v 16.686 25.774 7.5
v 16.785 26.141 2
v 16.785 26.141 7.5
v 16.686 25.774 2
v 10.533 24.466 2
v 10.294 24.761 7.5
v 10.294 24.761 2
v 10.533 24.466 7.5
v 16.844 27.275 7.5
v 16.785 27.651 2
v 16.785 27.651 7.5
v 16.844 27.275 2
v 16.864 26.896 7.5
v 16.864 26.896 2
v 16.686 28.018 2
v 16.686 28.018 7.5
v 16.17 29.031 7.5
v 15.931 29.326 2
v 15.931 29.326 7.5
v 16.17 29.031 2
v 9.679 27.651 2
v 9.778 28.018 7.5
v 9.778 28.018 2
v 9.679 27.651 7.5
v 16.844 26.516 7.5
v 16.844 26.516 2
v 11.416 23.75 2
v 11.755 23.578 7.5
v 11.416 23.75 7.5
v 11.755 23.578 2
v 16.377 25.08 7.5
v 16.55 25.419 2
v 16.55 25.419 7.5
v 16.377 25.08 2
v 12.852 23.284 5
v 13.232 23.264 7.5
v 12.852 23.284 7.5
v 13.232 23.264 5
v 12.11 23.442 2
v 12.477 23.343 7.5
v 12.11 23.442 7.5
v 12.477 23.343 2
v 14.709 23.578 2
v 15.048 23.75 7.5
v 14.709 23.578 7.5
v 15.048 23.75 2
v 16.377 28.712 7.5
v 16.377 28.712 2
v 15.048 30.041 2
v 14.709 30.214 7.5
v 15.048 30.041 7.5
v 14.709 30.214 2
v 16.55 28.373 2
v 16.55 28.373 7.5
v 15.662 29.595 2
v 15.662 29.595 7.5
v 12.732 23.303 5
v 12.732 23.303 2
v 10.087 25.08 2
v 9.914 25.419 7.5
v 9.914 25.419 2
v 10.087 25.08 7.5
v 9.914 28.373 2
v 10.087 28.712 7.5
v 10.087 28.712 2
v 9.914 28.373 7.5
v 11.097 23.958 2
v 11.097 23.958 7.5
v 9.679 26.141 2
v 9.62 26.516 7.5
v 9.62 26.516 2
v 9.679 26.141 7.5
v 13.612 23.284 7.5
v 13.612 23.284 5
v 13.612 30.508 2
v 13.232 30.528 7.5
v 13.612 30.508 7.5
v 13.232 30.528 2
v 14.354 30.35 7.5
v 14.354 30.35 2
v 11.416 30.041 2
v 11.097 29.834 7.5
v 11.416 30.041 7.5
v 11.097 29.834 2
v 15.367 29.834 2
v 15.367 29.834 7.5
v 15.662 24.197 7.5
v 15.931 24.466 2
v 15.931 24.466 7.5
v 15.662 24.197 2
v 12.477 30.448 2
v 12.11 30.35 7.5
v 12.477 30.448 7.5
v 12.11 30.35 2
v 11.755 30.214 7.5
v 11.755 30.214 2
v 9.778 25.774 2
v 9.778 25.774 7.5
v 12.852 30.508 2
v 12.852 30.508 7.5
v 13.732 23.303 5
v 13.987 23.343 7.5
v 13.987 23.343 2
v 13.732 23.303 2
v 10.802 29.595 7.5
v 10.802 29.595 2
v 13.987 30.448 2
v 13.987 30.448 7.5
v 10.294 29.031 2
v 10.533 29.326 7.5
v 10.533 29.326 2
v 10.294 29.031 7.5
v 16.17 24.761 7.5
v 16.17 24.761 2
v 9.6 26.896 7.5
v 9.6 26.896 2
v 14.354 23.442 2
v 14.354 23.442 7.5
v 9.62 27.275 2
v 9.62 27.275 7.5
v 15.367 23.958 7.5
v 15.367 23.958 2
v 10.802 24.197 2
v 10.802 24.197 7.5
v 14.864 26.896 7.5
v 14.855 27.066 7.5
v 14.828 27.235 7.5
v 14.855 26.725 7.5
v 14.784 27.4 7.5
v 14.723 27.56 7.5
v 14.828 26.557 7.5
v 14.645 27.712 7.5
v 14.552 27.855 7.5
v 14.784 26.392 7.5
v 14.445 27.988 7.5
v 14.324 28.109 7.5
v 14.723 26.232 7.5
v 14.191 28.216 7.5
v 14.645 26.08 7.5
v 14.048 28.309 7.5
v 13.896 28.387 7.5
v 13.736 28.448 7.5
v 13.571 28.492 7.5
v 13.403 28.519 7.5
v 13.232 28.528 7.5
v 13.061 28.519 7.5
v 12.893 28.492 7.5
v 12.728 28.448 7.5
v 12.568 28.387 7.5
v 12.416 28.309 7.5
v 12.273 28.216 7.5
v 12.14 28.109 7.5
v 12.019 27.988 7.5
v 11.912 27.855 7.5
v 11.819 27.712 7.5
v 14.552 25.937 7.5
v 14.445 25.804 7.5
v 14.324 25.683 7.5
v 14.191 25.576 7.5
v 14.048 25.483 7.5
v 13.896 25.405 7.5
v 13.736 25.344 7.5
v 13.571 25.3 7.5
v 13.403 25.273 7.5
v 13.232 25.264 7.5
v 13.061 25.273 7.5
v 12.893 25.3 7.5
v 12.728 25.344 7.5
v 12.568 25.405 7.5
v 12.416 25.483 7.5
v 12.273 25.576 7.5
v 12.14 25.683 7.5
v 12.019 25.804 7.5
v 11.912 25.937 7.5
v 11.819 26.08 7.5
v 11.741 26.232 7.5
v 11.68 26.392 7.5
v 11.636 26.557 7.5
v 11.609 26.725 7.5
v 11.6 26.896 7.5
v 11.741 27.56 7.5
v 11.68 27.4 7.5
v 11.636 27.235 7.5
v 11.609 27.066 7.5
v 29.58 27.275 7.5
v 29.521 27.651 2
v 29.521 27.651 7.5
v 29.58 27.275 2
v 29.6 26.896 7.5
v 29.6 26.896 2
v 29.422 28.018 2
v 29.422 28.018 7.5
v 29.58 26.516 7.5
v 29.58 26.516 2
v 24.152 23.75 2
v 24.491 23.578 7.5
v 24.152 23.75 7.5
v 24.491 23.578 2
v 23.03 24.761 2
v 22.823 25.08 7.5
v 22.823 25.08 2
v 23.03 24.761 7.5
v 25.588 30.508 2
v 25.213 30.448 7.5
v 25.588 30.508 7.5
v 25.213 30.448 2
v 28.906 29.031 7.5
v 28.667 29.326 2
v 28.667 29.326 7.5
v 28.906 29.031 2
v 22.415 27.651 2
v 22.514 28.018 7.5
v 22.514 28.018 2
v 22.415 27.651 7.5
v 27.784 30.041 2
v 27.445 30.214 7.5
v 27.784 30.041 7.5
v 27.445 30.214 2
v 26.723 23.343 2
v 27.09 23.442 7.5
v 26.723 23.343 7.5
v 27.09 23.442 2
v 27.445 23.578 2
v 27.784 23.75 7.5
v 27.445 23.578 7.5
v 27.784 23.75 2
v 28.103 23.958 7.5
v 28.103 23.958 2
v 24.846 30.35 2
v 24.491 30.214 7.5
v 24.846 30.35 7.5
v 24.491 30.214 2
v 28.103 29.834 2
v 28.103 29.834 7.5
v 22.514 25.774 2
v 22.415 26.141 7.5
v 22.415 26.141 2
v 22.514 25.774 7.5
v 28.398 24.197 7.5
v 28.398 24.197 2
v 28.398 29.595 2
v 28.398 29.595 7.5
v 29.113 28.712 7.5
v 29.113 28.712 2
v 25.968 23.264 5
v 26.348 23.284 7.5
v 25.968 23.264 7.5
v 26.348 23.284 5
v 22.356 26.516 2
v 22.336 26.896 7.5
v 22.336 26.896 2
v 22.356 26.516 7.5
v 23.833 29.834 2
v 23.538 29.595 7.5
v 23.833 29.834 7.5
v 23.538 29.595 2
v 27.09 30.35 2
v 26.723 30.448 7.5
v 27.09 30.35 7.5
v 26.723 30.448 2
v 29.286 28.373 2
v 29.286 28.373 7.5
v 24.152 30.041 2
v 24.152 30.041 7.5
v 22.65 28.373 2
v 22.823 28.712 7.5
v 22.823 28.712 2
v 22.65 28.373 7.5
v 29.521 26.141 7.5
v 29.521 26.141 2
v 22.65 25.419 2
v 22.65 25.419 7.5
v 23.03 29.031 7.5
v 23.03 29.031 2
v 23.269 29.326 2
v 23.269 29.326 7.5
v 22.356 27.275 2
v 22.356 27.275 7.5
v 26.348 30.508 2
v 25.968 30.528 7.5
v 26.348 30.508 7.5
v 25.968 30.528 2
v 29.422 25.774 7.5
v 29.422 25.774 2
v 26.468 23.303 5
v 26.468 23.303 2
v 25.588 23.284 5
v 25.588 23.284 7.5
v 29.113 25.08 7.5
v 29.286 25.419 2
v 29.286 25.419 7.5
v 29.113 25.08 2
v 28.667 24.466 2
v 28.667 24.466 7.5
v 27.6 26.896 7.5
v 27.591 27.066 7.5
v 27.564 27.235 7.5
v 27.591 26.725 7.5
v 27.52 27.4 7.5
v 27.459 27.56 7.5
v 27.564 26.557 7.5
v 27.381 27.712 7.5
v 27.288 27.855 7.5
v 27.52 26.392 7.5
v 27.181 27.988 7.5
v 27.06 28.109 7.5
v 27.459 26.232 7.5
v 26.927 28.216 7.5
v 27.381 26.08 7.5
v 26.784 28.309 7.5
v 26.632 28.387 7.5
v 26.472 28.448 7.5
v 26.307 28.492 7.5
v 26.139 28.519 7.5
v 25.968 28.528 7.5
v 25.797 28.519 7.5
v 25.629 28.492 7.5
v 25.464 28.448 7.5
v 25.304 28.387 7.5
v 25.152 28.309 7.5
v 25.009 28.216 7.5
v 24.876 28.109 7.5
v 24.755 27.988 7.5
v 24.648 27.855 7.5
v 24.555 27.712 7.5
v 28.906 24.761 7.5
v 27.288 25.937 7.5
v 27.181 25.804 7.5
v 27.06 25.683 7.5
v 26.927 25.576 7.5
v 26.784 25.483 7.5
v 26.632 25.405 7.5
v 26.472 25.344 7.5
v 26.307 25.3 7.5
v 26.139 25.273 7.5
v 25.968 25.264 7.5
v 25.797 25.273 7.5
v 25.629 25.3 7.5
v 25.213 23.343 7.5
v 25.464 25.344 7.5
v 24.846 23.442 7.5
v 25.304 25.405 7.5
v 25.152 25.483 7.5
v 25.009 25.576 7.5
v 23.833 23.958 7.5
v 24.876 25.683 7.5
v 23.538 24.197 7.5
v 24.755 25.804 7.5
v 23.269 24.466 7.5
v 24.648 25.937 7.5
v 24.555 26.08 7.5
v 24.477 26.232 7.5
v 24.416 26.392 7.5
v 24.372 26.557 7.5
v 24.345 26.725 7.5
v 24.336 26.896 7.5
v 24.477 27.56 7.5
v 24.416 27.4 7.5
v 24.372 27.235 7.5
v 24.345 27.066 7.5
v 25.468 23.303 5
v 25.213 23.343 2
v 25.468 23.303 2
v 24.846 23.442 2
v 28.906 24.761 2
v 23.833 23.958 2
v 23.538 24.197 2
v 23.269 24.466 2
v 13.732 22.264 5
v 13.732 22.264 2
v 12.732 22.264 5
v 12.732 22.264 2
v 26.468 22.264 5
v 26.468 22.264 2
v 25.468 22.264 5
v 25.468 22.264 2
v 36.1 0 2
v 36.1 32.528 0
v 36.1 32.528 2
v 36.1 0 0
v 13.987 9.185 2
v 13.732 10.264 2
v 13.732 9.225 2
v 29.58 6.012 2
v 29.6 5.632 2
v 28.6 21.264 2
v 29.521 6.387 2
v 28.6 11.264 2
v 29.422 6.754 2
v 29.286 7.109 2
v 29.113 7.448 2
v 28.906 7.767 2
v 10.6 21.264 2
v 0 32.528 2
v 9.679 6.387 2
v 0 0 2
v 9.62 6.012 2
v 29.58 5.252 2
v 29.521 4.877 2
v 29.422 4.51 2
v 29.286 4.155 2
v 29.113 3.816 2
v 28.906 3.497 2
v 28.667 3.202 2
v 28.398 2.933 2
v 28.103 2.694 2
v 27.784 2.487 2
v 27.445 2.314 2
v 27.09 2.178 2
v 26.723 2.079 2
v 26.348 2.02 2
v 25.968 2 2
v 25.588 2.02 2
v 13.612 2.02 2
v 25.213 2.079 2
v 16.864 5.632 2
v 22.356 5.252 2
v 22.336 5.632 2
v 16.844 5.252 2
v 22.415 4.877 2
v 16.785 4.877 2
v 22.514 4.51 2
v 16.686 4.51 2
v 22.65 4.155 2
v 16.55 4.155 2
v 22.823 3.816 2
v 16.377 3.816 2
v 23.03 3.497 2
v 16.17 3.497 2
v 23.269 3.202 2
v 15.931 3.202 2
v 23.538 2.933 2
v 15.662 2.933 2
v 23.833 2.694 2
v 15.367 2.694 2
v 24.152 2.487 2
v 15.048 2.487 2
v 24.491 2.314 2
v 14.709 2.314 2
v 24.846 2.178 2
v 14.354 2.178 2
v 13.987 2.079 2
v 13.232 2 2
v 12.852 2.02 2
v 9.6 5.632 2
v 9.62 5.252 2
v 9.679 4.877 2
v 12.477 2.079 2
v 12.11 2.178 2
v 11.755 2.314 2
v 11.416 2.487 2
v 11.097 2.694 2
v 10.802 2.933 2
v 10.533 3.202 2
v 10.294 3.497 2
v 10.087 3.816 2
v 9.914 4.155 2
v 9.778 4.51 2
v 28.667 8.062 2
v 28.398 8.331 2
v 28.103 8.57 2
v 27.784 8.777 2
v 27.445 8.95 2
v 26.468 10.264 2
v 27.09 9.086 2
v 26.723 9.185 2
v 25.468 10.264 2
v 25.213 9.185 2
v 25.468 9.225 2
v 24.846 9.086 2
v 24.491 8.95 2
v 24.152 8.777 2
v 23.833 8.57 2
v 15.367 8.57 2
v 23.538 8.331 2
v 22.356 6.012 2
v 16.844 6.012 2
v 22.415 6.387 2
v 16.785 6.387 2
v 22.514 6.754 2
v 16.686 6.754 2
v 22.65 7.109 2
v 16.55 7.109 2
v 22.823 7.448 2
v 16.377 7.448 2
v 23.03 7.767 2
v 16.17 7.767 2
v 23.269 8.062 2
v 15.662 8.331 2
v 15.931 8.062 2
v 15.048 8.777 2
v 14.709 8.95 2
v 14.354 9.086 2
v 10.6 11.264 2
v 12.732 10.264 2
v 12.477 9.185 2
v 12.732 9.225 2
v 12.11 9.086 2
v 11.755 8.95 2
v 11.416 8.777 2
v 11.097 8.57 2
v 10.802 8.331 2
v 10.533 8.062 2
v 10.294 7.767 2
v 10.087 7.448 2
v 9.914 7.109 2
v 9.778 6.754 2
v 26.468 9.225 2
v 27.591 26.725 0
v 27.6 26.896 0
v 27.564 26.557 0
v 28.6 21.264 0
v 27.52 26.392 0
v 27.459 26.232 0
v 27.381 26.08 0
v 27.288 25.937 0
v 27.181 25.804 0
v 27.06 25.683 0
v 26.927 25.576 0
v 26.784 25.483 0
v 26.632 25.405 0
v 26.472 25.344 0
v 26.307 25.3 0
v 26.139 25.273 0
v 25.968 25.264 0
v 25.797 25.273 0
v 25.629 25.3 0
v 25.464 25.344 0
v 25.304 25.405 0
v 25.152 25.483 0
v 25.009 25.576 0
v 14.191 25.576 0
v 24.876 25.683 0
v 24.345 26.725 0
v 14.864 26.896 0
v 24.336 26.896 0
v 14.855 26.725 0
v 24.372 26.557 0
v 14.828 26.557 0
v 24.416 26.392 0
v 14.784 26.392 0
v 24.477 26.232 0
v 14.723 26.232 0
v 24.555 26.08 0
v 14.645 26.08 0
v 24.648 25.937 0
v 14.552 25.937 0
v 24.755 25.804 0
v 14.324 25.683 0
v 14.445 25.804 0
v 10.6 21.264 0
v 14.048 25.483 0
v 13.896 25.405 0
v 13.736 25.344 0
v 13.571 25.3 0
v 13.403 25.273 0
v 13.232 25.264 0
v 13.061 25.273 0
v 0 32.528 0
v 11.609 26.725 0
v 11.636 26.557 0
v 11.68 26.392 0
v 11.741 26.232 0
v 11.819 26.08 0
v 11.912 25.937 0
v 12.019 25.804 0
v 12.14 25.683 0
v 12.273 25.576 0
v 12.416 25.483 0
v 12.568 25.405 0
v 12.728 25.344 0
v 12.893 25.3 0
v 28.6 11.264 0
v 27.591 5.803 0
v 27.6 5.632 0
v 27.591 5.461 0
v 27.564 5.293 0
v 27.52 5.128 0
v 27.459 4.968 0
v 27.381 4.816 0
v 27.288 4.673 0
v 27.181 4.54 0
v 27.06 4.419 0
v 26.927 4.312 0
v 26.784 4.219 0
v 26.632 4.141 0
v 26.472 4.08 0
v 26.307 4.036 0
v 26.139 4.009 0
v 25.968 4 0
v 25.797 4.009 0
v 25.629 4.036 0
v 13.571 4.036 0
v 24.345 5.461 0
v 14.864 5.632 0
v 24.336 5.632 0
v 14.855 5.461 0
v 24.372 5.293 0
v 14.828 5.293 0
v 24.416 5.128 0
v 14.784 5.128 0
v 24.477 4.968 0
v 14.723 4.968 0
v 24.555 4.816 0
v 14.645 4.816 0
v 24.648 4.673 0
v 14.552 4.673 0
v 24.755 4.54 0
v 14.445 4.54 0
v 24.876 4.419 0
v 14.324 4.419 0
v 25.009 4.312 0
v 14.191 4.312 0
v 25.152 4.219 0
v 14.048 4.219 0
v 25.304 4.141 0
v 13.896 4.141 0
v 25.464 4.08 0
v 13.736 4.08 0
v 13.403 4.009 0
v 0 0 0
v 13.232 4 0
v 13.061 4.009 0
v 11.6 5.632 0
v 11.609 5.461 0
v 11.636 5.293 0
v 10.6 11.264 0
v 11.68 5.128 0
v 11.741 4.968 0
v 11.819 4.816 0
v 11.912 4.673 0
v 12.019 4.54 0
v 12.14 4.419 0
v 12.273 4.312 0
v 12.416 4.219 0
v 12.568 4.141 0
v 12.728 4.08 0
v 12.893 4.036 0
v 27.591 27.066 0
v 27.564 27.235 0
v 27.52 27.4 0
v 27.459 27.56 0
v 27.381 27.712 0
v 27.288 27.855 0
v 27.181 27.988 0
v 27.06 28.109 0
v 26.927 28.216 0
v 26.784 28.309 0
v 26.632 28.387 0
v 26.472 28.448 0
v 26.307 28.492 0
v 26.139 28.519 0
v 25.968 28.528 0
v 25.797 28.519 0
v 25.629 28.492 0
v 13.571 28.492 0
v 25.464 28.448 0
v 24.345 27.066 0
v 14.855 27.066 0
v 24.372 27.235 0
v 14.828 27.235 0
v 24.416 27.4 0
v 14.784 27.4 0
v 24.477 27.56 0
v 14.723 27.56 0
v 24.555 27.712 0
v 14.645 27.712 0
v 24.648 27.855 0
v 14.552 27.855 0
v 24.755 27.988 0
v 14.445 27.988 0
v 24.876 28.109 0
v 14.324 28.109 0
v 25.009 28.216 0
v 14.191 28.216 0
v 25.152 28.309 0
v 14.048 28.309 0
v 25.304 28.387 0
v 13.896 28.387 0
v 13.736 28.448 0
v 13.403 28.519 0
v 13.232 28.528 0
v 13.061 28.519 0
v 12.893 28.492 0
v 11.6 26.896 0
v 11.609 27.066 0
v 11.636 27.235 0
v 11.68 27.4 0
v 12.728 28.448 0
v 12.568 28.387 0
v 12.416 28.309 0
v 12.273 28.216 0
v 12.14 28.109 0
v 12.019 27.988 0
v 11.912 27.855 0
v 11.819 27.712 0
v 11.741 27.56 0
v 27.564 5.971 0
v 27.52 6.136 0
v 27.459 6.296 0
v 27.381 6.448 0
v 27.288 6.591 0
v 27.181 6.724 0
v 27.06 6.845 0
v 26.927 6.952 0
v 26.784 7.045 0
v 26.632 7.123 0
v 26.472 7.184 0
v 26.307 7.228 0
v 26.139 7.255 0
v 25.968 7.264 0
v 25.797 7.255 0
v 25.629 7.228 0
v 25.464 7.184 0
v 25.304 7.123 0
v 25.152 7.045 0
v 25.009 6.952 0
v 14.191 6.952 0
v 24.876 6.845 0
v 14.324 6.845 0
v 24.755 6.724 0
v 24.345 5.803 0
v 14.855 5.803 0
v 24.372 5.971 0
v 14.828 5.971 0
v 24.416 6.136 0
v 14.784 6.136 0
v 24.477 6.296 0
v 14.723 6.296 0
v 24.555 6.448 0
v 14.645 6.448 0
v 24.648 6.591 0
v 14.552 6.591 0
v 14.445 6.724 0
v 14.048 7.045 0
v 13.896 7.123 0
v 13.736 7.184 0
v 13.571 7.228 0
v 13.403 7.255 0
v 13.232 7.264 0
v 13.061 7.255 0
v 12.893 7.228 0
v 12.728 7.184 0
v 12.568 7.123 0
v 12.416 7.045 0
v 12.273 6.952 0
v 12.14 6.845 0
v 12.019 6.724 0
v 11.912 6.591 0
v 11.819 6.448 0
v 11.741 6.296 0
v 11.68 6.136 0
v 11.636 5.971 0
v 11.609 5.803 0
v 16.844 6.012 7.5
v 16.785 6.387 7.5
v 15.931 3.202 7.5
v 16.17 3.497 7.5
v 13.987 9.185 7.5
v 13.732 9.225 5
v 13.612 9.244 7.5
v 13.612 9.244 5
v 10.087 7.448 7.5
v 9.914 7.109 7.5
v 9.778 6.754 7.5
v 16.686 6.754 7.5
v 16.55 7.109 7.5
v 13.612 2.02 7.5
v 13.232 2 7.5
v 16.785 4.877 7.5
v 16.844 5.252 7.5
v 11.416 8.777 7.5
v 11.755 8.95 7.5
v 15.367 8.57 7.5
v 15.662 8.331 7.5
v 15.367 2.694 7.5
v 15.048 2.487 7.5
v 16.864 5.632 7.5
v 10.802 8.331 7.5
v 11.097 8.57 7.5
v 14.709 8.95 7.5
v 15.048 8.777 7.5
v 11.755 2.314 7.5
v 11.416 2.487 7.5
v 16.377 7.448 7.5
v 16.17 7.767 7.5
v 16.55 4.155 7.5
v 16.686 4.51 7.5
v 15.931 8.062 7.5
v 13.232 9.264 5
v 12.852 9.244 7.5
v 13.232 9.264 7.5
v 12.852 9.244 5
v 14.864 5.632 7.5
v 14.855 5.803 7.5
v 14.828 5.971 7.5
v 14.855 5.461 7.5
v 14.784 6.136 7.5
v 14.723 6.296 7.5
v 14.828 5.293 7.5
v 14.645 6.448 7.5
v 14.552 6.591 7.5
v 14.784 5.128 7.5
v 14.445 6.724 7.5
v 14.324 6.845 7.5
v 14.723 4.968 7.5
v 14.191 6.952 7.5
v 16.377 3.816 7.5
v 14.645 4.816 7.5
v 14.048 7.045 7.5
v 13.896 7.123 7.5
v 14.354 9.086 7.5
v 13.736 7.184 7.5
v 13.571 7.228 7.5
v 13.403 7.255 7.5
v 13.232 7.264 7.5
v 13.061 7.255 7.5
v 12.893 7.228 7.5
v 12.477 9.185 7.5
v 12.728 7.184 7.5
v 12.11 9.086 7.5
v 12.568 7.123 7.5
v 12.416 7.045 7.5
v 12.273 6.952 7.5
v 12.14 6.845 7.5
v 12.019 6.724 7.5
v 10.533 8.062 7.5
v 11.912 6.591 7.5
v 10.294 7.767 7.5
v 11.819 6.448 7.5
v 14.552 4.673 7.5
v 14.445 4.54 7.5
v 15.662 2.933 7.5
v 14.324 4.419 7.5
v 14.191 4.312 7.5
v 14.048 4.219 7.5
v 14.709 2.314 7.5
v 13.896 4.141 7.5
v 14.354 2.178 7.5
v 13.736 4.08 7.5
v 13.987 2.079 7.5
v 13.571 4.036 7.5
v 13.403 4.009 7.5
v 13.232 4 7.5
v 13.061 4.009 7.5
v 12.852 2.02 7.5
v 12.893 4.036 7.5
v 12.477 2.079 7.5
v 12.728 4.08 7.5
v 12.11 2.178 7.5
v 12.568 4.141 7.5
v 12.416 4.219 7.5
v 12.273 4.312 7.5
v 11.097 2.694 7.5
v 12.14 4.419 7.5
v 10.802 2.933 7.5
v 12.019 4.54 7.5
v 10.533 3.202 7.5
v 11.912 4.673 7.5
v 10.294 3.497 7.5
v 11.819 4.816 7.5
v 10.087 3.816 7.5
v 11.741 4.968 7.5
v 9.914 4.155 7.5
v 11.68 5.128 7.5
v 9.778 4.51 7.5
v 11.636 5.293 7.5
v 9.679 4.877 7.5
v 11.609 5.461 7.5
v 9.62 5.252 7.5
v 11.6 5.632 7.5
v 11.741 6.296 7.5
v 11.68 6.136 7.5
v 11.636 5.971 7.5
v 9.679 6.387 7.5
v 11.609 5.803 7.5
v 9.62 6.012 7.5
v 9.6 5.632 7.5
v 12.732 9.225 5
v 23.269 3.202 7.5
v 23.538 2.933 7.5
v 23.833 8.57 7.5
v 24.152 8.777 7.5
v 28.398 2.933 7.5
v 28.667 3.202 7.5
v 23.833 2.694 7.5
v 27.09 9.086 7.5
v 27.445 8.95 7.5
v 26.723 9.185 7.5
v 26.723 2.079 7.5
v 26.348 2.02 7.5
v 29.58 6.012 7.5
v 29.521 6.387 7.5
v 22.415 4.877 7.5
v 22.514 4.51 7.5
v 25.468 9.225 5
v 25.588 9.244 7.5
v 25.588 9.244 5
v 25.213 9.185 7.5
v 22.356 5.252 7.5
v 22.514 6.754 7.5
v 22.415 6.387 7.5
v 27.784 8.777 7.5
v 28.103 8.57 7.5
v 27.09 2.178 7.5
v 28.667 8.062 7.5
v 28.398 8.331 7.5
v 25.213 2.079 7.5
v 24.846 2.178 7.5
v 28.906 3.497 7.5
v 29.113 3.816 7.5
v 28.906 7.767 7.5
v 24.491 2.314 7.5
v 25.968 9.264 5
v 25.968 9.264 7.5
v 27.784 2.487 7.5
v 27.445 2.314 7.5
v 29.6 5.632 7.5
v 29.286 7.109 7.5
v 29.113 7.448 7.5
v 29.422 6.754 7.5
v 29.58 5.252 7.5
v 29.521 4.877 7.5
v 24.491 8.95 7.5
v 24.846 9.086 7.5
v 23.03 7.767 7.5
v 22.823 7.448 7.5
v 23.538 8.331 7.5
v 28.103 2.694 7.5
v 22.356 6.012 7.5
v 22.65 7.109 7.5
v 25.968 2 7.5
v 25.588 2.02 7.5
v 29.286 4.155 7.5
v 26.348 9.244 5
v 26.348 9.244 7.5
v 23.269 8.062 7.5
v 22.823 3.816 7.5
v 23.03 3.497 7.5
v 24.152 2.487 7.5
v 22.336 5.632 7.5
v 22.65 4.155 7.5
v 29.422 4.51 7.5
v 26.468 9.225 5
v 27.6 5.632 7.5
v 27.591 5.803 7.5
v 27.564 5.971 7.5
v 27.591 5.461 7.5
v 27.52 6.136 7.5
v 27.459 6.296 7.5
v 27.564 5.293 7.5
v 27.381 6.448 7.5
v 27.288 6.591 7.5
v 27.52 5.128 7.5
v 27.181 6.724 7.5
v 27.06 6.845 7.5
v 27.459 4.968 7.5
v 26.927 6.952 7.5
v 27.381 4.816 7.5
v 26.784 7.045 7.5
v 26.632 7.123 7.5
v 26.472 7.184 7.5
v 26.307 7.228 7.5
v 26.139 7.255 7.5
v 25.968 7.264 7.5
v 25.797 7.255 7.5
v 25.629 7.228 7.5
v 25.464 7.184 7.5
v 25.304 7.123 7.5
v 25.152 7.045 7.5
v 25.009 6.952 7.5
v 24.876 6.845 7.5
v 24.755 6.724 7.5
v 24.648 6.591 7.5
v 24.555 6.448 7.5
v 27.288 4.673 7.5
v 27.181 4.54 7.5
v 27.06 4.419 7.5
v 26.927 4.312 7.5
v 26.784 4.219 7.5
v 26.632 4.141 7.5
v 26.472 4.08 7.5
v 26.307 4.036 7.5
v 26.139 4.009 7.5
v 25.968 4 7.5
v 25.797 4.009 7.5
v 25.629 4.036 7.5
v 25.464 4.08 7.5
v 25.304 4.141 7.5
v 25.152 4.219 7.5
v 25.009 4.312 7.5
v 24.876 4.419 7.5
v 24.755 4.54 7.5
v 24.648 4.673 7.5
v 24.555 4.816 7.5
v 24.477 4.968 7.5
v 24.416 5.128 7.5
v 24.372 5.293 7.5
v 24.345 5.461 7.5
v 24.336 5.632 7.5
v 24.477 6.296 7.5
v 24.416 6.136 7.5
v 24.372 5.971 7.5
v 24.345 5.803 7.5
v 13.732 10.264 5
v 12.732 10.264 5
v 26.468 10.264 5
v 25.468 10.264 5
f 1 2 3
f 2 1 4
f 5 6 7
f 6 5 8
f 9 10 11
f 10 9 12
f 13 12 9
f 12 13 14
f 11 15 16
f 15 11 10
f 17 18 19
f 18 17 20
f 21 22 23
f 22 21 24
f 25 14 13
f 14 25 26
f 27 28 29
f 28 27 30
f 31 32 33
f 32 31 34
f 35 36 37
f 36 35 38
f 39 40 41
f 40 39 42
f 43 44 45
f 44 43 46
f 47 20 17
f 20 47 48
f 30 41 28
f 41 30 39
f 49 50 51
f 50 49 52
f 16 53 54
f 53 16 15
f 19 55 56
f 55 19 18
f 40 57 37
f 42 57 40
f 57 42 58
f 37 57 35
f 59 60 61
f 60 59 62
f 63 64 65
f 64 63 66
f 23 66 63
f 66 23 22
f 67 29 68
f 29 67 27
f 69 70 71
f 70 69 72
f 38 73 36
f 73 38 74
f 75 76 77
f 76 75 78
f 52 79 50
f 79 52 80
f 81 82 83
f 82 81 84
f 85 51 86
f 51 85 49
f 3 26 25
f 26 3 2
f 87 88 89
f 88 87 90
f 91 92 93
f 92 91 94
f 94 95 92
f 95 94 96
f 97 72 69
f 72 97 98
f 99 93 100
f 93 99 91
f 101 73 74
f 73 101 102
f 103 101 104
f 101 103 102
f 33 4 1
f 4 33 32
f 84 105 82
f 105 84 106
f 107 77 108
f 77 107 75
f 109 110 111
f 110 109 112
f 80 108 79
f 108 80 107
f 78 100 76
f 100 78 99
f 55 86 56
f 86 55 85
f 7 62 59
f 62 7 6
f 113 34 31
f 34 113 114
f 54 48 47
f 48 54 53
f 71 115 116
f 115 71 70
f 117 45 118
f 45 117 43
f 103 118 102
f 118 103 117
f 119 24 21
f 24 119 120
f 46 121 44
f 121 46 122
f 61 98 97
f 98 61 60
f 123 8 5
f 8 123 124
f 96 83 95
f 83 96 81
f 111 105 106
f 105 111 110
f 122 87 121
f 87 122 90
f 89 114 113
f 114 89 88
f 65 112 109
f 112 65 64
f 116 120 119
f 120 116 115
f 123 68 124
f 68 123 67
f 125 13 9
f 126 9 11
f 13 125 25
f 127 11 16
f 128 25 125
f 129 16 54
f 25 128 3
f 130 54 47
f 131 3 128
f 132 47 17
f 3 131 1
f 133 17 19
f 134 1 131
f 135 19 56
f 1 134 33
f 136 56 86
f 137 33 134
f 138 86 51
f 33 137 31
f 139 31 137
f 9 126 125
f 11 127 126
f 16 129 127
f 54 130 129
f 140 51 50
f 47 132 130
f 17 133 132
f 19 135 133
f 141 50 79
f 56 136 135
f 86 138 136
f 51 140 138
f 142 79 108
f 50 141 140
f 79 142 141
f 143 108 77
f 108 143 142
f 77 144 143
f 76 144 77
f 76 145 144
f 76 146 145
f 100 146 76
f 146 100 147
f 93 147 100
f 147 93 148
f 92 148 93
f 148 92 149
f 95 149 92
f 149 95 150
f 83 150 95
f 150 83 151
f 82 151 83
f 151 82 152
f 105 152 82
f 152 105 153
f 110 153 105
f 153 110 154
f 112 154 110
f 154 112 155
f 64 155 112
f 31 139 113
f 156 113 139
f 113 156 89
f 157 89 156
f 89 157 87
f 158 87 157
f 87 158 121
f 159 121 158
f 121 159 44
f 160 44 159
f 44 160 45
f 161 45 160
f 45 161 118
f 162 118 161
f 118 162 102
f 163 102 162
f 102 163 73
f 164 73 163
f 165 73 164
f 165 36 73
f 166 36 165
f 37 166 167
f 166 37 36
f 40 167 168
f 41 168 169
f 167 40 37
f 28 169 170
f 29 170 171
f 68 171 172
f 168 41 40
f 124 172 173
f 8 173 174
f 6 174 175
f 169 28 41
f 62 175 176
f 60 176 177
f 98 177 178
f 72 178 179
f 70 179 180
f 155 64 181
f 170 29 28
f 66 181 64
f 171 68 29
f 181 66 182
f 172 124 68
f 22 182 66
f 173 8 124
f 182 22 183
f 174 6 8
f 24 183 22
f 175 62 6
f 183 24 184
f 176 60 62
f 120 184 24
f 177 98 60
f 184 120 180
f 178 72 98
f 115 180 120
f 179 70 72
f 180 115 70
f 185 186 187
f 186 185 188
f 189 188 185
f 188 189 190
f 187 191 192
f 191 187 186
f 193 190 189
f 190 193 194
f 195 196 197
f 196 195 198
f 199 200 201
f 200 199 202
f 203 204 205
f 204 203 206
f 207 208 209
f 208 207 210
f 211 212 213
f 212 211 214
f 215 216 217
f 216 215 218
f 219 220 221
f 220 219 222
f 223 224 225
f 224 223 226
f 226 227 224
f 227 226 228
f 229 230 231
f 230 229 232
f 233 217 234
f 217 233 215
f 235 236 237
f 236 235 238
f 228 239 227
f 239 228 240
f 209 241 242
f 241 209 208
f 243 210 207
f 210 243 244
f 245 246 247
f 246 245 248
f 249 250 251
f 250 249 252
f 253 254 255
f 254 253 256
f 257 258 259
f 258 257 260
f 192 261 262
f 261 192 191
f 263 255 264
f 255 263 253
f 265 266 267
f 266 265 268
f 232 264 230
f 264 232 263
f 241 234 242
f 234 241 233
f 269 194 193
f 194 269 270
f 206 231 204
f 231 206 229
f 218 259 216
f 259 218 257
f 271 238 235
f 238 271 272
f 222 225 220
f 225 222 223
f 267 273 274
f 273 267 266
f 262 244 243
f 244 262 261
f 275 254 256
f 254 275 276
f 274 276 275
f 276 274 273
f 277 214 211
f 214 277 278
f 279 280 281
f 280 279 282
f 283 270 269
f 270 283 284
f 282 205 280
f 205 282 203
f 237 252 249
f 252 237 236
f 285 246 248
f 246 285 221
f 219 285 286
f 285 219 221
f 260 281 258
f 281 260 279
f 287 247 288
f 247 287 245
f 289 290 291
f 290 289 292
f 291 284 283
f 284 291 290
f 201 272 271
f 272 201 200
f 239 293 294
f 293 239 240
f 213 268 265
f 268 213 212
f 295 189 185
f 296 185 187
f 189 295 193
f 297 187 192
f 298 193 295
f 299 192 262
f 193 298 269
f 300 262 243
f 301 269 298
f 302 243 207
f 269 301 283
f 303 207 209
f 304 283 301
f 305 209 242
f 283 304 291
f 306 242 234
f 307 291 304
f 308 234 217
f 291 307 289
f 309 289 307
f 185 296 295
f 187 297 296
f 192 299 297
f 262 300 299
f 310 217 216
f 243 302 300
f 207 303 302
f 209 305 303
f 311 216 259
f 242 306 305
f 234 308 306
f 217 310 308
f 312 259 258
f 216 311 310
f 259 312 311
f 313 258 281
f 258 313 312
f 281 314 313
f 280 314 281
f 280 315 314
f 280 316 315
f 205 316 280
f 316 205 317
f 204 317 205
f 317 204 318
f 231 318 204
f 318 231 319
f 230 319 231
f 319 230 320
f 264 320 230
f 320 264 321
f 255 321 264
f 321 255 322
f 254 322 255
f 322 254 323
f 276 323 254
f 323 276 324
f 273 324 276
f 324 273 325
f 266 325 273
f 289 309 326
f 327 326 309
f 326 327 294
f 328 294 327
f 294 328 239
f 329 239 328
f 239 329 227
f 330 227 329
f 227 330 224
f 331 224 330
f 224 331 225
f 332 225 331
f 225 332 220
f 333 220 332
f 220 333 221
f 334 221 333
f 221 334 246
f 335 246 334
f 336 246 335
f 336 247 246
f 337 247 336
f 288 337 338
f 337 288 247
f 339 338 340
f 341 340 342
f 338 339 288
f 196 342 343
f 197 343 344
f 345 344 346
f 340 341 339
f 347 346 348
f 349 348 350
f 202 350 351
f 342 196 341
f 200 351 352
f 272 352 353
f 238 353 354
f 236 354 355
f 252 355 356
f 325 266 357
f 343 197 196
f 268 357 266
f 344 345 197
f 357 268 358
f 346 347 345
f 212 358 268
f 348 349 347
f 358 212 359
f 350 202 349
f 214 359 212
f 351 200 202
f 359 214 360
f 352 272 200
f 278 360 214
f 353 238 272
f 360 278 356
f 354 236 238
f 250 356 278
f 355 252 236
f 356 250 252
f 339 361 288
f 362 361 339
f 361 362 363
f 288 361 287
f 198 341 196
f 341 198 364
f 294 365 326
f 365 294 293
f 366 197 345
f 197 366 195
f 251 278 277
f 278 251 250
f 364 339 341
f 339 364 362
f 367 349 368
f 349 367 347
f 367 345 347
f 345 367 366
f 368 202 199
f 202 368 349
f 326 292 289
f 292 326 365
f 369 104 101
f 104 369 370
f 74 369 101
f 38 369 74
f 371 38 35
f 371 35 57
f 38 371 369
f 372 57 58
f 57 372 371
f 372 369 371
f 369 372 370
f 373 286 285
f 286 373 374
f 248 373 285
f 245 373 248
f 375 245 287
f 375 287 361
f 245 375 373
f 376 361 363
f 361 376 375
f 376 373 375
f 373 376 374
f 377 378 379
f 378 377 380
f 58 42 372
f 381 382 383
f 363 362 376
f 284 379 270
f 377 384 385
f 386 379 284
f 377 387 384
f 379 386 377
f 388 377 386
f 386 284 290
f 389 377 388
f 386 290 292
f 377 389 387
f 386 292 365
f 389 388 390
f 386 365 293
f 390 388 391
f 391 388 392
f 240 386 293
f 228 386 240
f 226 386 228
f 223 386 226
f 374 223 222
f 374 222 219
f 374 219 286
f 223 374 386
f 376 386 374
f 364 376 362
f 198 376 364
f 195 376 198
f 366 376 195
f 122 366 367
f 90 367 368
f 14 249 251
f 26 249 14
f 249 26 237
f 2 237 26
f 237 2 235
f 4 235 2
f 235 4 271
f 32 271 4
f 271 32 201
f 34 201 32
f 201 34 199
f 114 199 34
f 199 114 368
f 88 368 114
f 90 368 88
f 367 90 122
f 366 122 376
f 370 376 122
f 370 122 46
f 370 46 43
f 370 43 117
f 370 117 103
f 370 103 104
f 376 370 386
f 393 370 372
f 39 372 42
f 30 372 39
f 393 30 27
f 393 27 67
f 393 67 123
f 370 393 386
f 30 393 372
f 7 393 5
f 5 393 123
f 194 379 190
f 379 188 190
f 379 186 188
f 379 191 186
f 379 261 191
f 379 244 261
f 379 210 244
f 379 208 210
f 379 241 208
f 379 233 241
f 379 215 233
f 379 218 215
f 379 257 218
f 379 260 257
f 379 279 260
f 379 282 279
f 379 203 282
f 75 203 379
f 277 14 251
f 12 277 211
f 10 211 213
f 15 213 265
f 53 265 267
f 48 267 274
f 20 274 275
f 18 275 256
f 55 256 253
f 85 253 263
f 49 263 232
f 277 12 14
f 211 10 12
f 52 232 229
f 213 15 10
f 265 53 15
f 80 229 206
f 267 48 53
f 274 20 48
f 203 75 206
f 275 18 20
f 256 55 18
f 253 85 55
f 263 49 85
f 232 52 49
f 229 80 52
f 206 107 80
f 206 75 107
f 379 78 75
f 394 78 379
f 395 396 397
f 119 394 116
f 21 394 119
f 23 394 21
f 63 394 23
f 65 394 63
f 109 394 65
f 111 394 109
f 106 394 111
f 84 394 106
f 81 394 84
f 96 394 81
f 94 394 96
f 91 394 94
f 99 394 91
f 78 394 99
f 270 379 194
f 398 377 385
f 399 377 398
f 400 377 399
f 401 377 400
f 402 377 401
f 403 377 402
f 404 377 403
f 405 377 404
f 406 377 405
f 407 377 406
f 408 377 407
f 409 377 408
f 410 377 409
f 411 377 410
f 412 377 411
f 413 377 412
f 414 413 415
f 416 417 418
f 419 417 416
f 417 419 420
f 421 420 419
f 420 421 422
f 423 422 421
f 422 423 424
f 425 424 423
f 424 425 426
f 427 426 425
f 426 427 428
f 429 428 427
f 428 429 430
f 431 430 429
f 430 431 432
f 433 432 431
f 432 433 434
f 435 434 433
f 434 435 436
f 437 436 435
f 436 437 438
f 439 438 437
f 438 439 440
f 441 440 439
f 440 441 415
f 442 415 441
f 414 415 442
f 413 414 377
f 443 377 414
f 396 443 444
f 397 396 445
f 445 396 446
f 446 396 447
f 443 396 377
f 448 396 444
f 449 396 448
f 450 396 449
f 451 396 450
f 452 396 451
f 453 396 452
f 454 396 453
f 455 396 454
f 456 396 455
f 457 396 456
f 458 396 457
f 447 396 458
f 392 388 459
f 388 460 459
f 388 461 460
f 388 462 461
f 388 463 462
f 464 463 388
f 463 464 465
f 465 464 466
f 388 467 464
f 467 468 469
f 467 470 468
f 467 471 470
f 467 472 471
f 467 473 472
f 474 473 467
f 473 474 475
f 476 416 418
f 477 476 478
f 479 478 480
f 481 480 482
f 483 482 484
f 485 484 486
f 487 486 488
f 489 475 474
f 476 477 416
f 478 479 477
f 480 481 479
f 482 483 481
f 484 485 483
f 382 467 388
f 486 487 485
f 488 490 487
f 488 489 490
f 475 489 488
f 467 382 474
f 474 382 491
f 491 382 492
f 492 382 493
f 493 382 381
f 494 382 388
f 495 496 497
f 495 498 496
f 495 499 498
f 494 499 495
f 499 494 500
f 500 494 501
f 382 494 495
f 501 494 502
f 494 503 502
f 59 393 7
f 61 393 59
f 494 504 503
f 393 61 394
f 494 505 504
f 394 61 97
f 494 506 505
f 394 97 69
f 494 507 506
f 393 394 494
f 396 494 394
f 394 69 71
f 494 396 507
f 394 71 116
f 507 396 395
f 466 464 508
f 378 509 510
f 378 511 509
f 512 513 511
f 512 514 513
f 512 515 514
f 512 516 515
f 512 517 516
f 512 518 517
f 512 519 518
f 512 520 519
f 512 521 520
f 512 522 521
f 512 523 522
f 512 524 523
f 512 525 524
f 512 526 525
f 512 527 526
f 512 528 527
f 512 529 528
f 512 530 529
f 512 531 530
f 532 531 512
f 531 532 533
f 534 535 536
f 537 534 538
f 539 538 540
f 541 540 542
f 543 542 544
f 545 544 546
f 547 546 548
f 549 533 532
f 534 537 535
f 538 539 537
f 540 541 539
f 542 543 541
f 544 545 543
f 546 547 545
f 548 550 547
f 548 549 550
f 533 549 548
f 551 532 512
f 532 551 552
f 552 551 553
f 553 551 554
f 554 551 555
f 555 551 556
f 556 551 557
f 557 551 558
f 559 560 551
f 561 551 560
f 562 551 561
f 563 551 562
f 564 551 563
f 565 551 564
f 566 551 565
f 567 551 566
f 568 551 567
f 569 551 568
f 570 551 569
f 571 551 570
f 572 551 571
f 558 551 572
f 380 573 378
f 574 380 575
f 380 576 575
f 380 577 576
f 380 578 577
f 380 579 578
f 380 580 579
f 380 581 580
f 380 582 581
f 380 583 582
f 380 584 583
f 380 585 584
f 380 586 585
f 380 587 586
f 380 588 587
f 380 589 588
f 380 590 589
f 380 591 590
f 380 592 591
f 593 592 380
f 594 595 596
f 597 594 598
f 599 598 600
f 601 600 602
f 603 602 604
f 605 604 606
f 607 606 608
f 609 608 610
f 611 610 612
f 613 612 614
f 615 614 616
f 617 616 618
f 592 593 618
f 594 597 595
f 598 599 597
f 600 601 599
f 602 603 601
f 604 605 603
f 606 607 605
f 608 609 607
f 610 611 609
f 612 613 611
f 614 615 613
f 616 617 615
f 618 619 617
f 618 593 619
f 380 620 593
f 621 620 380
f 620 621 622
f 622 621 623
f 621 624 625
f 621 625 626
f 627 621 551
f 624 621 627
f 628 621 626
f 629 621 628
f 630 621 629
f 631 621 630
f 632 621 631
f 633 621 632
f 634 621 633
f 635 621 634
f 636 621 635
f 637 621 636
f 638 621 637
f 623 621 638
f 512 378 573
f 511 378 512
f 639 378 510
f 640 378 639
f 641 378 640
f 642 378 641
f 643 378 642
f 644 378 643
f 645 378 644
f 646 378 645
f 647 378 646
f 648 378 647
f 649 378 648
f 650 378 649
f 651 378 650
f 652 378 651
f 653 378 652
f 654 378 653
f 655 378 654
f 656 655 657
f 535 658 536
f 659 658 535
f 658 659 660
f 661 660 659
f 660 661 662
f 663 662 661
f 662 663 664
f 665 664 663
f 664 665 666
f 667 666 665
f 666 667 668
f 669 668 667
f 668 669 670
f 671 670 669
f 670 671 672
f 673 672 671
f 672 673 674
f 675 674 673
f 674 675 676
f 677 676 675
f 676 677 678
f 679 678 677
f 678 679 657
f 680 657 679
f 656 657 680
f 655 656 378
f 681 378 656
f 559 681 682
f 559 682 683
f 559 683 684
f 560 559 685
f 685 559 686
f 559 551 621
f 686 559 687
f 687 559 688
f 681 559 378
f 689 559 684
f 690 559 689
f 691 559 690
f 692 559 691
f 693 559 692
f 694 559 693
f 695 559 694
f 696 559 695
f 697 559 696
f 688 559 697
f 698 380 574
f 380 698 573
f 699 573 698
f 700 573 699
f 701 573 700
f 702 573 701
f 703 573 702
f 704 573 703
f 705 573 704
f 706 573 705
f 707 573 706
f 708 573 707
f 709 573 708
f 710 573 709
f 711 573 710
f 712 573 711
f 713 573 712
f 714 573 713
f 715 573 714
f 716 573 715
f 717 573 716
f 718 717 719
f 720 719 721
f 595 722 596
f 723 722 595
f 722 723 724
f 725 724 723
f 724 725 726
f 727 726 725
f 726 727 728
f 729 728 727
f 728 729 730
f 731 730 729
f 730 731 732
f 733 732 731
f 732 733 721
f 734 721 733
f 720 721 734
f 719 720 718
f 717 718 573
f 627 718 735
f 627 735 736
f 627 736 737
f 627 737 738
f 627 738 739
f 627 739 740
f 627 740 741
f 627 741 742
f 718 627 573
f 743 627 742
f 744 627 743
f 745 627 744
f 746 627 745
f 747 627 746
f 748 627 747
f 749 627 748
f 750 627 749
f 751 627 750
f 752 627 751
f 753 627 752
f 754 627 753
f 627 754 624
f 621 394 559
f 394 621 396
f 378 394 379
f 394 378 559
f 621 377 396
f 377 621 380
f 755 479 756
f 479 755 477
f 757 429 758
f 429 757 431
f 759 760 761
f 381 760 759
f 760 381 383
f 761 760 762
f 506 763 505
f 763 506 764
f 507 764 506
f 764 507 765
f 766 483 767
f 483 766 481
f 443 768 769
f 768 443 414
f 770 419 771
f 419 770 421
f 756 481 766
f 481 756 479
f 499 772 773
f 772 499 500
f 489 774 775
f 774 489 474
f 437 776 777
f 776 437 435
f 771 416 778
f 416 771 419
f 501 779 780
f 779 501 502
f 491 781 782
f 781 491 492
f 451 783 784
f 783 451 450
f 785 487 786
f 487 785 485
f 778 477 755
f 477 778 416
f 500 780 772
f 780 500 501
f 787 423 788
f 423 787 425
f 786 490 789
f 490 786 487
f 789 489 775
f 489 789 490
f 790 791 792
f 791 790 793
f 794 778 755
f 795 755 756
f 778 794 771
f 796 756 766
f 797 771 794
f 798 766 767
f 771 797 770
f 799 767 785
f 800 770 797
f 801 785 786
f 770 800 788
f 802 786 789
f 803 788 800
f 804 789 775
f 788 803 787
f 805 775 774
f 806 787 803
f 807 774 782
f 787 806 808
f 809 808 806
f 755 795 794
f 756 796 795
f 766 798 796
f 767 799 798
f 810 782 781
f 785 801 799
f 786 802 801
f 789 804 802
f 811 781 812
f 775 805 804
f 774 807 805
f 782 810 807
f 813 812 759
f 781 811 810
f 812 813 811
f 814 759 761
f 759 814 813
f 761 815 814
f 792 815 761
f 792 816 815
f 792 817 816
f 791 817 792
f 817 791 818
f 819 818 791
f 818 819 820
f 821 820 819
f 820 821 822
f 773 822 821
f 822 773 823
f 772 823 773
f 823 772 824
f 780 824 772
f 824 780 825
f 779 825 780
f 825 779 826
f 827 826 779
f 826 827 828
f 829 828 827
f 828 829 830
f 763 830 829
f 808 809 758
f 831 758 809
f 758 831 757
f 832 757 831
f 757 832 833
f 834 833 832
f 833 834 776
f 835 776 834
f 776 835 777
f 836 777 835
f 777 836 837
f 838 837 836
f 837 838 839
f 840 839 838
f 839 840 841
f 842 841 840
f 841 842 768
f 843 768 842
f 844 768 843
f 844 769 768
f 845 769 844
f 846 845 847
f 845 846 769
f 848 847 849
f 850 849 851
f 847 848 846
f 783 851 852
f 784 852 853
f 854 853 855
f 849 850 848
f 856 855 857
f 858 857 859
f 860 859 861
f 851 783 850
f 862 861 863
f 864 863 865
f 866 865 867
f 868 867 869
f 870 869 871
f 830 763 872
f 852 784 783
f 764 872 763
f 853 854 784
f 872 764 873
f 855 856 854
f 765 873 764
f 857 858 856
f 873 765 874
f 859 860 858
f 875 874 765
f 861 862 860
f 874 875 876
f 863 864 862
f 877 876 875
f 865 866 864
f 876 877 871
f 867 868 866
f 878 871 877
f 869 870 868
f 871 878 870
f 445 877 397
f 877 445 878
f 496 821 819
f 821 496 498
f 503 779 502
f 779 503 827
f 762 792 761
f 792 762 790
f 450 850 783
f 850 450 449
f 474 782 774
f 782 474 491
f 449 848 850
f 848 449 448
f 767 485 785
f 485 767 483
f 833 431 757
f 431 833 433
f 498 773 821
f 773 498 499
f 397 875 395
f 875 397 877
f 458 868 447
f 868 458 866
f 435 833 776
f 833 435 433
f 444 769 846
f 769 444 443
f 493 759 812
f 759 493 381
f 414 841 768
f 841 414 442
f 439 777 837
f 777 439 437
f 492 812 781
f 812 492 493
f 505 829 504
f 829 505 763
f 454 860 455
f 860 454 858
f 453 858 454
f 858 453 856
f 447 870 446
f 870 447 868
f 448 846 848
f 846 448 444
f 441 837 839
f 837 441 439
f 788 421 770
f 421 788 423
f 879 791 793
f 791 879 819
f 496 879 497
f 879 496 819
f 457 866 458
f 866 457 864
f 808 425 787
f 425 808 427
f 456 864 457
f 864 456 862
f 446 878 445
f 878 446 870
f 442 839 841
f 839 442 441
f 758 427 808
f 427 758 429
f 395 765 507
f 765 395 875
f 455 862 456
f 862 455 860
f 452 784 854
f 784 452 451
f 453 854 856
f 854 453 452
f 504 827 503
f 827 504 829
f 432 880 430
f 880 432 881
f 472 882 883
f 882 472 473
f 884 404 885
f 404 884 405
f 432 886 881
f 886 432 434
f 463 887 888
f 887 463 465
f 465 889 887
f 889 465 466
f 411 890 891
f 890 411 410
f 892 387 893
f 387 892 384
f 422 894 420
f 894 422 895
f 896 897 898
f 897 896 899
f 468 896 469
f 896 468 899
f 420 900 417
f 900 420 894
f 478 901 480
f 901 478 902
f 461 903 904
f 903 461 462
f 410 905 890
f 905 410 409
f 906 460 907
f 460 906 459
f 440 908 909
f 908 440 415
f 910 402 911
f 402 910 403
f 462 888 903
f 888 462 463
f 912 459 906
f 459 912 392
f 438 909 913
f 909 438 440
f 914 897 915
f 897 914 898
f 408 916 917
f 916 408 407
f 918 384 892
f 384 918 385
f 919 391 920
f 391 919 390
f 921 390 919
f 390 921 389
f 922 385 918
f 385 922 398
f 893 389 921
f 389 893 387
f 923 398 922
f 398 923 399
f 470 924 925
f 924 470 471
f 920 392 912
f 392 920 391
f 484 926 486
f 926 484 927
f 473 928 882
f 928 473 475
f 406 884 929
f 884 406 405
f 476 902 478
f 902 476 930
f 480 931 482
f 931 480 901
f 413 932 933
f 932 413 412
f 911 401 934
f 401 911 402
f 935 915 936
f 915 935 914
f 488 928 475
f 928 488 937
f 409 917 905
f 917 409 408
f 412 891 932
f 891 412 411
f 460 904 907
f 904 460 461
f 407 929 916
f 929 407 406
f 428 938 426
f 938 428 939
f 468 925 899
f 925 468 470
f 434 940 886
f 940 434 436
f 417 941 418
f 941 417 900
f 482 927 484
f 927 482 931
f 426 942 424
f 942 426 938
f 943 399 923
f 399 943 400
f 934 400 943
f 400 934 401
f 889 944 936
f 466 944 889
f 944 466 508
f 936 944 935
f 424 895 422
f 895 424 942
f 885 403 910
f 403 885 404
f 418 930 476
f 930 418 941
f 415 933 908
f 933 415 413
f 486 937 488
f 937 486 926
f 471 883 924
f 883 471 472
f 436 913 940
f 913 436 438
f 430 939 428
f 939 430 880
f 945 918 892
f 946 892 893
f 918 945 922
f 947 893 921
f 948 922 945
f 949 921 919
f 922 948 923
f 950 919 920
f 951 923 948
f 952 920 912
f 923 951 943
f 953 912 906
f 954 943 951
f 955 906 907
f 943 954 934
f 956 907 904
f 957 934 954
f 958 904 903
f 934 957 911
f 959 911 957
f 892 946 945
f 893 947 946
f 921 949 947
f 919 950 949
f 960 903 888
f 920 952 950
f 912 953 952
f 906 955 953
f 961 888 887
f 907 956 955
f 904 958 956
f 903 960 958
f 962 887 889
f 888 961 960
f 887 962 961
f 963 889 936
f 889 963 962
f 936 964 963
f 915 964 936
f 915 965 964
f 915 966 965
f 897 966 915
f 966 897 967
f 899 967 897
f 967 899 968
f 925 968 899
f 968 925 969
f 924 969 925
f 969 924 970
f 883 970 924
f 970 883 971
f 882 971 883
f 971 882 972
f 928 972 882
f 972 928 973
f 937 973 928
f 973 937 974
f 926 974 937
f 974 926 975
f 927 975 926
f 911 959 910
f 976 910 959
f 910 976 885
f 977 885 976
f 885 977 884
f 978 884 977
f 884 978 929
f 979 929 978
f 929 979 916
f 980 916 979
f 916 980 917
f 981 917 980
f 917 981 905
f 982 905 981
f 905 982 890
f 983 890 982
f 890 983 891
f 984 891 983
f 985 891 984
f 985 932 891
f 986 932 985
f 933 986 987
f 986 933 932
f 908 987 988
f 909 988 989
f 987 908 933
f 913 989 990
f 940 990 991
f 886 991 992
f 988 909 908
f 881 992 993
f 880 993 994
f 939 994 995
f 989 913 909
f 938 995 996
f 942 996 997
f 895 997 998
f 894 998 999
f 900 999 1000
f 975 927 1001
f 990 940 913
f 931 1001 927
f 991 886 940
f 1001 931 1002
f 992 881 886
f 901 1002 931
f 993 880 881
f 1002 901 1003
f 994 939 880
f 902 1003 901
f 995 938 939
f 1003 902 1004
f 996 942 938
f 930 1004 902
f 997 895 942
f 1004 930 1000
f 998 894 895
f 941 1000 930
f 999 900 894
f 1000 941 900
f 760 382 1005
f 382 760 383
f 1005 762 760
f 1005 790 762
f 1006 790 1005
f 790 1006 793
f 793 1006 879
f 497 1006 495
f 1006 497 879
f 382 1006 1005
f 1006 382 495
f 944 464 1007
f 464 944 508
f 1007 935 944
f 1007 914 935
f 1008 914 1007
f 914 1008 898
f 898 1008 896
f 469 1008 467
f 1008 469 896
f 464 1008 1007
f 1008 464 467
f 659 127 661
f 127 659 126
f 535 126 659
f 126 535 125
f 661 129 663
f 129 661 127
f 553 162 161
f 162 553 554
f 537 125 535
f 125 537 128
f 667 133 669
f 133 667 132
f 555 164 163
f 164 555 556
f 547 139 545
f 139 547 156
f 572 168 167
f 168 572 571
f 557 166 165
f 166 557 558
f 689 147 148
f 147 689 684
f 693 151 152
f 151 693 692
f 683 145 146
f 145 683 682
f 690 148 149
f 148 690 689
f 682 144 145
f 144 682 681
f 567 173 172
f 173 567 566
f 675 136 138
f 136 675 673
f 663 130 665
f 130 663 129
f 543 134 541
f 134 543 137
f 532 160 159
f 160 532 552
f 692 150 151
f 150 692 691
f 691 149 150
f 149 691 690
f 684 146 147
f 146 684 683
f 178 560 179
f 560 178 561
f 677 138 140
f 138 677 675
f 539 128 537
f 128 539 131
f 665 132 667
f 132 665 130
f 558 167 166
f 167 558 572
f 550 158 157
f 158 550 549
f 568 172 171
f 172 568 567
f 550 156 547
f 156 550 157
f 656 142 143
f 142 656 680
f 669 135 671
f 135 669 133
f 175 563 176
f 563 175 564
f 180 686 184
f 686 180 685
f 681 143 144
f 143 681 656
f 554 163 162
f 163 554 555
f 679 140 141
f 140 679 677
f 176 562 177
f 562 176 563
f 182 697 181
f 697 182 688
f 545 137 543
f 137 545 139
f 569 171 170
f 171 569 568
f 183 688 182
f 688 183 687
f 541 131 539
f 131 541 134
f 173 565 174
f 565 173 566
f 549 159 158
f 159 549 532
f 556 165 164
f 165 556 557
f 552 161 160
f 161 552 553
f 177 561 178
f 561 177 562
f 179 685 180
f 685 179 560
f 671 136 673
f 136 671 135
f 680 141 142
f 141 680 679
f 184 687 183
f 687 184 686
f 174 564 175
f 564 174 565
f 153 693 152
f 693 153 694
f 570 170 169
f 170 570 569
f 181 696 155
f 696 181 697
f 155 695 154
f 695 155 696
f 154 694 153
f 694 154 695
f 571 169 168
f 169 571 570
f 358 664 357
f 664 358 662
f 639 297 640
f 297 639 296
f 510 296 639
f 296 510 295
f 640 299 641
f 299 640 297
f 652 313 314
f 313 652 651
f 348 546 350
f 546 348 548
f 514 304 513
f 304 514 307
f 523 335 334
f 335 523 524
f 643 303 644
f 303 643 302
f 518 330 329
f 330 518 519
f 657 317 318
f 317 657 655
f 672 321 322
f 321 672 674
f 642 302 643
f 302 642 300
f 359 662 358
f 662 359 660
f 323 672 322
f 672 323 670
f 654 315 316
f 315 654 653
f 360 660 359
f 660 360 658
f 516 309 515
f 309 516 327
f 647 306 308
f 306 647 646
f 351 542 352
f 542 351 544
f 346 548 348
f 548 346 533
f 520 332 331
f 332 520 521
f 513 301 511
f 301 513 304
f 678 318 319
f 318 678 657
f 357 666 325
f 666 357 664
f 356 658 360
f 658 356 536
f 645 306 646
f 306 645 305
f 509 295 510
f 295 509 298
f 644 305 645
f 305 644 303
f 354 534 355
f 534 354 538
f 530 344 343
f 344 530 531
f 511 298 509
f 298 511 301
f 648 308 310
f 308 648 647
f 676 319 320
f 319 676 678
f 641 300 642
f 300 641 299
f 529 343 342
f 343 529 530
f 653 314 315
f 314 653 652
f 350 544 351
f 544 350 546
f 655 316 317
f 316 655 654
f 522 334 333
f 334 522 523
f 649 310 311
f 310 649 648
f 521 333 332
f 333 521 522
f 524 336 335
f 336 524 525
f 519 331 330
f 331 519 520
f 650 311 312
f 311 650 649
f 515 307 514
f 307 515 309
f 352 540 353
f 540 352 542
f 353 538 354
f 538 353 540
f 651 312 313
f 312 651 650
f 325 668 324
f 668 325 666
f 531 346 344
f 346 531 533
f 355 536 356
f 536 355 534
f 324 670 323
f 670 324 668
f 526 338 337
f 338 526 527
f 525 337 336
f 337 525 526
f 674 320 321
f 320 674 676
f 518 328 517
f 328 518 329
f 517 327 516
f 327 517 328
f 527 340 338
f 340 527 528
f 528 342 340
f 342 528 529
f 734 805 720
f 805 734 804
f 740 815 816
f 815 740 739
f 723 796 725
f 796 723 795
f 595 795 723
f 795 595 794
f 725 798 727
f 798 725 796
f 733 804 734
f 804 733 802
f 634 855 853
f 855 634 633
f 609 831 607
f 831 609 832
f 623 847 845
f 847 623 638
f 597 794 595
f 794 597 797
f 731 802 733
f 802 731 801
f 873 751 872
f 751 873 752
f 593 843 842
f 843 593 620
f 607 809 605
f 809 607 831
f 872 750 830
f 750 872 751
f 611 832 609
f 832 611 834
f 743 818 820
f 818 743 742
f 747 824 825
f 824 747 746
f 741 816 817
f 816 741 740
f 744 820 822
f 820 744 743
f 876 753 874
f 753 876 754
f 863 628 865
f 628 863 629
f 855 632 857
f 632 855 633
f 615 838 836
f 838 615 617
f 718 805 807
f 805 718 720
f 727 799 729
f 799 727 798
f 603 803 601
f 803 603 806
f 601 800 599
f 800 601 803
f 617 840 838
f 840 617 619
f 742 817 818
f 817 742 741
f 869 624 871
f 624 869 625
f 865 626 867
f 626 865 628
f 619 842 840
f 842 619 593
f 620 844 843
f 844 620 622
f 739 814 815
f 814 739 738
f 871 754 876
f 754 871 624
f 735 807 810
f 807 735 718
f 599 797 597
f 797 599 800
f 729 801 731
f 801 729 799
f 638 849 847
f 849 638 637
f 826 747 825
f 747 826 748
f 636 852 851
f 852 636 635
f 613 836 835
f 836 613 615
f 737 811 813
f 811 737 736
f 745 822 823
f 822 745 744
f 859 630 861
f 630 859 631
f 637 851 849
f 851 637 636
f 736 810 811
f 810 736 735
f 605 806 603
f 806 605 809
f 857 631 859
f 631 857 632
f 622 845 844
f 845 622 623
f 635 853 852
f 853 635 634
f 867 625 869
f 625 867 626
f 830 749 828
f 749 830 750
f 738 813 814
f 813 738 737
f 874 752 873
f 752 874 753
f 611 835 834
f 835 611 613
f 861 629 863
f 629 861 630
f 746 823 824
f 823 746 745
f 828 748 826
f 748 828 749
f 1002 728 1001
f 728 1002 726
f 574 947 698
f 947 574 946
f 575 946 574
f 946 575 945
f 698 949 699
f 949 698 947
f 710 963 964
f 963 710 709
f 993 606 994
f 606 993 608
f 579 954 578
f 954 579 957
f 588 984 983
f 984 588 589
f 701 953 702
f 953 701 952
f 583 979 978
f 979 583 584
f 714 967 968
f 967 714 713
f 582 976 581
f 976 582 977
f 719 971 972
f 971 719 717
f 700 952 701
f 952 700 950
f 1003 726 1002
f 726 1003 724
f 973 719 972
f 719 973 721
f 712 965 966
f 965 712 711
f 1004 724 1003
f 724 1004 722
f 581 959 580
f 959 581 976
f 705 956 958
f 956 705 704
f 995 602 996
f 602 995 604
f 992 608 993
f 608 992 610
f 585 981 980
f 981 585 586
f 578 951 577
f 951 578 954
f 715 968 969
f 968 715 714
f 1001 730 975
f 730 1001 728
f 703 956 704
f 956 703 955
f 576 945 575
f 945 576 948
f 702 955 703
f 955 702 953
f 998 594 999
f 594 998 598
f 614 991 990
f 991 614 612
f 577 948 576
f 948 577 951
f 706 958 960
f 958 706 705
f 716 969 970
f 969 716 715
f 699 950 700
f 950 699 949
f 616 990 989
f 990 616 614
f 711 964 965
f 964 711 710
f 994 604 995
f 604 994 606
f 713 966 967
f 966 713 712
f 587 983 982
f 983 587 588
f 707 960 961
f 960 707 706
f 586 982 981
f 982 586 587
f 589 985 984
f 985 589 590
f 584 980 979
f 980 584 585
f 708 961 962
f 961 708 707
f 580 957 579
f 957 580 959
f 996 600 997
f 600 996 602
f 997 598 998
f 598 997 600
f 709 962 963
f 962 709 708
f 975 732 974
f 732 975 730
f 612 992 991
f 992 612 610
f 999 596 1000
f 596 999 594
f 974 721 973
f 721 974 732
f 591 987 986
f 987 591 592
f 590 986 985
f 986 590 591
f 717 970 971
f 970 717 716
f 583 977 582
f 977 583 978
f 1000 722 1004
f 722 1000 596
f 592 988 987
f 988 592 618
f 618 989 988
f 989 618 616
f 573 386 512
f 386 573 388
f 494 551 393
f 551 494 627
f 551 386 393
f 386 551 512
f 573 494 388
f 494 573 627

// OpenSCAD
inch = 25.4;

// solenoid dimensions
sol_width = 12.0;
sol_height = 11.0;
sol_length = 20.0;

// base plate

// dimensions
screw_hole = 0.1285 * inch;
hole_sup = 2.0*2 + screw_hole;
wall = 2.0;

tab_len = 1.0;
tab_wid = 1.0;
tab_height = 3.0;
plung_ex = 7.6;

plate_length = sol_length + plung_ex + 2 + 4.5 + 2;

plate_width = sol_width + 2*tab_len + 2*hole_sup + 2*wall;

opening_length = sol_length - 2*1.0;
opening_width = sol_width - 2*1.0;

base_plate_size = [plate_length, plate_width, 2.0];
hole_support_1_trans = [plung_ex+2+hole_sup/2, 2+hole_sup/2, 1.5];
hole_support_2_trans = [plung_ex+2+sol_length-hole_sup/2, 2+hole_sup/2, 1.5];

copy_other_side_trans = [0, sol_width + hole_sup + 2*tab_len, 0];

screw_hole_1_trans = hole_support_1_trans + [0, 0, -2.0];
screw_hole_2_trans = hole_support_2_trans + [0, 0, -2.0];

tab_dim = [tab_wid, tab_len+0.5, tab_height+0.5];

module hole_support()
{
   cylinder(h=sol_height/2+0.5, d=hole_sup, $fn=60);  
}

module screw_hole()
{
   cylinder(h=sol_height/2+2.0+1, d=screw_hole, $fn=60);
}

module tab()
{
    cube(tab_dim);  
}

difference()
{
  union()
  {
    cube(base_plate_size);    // plate
    translate(hole_support_1_trans) { hole_support(); } //1
    translate(hole_support_2_trans) { hole_support(); } //2
    translate(copy_other_side_trans)
    {
      translate(hole_support_1_trans) { hole_support(); } //3
      translate(hole_support_2_trans) { hole_support(); } //4
    }
    translate(hole_support_1_trans + [-tab_wid/2, hole_sup/2-0.5, 0]) { tab(); }
    translate(hole_support_2_trans + [-tab_wid/2, hole_sup/2-0.5, 0]) { tab(); }
    translate(copy_other_side_trans)
    {
      translate(hole_support_1_trans + [-tab_wid/2, -tab_len-0.5 -(hole_sup/2-0.5), 0]) { tab(); }
      translate(hole_support_2_trans + [-tab_wid/2, -tab_len-0.5 -(hole_sup/2-0.5), 0]) { tab(); }
    }
  }     // end of union
  translate(screw_hole_1_trans)  { screw_hole(); }  //1
  translate(screw_hole_2_trans)  { screw_hole(); }  //2
  translate(copy_other_side_trans)
  {
      translate(screw_hole_1_trans) { screw_hole(); } //3
      translate(screw_hole_2_trans) { screw_hole(); } //4
  }
  translate([plung_ex+1+2, hole_sup+tab_len+wall+1, -0.5 ])
  {
    cube([sol_length-2, sol_width-2, 2.0+1.0]);
  }
}
